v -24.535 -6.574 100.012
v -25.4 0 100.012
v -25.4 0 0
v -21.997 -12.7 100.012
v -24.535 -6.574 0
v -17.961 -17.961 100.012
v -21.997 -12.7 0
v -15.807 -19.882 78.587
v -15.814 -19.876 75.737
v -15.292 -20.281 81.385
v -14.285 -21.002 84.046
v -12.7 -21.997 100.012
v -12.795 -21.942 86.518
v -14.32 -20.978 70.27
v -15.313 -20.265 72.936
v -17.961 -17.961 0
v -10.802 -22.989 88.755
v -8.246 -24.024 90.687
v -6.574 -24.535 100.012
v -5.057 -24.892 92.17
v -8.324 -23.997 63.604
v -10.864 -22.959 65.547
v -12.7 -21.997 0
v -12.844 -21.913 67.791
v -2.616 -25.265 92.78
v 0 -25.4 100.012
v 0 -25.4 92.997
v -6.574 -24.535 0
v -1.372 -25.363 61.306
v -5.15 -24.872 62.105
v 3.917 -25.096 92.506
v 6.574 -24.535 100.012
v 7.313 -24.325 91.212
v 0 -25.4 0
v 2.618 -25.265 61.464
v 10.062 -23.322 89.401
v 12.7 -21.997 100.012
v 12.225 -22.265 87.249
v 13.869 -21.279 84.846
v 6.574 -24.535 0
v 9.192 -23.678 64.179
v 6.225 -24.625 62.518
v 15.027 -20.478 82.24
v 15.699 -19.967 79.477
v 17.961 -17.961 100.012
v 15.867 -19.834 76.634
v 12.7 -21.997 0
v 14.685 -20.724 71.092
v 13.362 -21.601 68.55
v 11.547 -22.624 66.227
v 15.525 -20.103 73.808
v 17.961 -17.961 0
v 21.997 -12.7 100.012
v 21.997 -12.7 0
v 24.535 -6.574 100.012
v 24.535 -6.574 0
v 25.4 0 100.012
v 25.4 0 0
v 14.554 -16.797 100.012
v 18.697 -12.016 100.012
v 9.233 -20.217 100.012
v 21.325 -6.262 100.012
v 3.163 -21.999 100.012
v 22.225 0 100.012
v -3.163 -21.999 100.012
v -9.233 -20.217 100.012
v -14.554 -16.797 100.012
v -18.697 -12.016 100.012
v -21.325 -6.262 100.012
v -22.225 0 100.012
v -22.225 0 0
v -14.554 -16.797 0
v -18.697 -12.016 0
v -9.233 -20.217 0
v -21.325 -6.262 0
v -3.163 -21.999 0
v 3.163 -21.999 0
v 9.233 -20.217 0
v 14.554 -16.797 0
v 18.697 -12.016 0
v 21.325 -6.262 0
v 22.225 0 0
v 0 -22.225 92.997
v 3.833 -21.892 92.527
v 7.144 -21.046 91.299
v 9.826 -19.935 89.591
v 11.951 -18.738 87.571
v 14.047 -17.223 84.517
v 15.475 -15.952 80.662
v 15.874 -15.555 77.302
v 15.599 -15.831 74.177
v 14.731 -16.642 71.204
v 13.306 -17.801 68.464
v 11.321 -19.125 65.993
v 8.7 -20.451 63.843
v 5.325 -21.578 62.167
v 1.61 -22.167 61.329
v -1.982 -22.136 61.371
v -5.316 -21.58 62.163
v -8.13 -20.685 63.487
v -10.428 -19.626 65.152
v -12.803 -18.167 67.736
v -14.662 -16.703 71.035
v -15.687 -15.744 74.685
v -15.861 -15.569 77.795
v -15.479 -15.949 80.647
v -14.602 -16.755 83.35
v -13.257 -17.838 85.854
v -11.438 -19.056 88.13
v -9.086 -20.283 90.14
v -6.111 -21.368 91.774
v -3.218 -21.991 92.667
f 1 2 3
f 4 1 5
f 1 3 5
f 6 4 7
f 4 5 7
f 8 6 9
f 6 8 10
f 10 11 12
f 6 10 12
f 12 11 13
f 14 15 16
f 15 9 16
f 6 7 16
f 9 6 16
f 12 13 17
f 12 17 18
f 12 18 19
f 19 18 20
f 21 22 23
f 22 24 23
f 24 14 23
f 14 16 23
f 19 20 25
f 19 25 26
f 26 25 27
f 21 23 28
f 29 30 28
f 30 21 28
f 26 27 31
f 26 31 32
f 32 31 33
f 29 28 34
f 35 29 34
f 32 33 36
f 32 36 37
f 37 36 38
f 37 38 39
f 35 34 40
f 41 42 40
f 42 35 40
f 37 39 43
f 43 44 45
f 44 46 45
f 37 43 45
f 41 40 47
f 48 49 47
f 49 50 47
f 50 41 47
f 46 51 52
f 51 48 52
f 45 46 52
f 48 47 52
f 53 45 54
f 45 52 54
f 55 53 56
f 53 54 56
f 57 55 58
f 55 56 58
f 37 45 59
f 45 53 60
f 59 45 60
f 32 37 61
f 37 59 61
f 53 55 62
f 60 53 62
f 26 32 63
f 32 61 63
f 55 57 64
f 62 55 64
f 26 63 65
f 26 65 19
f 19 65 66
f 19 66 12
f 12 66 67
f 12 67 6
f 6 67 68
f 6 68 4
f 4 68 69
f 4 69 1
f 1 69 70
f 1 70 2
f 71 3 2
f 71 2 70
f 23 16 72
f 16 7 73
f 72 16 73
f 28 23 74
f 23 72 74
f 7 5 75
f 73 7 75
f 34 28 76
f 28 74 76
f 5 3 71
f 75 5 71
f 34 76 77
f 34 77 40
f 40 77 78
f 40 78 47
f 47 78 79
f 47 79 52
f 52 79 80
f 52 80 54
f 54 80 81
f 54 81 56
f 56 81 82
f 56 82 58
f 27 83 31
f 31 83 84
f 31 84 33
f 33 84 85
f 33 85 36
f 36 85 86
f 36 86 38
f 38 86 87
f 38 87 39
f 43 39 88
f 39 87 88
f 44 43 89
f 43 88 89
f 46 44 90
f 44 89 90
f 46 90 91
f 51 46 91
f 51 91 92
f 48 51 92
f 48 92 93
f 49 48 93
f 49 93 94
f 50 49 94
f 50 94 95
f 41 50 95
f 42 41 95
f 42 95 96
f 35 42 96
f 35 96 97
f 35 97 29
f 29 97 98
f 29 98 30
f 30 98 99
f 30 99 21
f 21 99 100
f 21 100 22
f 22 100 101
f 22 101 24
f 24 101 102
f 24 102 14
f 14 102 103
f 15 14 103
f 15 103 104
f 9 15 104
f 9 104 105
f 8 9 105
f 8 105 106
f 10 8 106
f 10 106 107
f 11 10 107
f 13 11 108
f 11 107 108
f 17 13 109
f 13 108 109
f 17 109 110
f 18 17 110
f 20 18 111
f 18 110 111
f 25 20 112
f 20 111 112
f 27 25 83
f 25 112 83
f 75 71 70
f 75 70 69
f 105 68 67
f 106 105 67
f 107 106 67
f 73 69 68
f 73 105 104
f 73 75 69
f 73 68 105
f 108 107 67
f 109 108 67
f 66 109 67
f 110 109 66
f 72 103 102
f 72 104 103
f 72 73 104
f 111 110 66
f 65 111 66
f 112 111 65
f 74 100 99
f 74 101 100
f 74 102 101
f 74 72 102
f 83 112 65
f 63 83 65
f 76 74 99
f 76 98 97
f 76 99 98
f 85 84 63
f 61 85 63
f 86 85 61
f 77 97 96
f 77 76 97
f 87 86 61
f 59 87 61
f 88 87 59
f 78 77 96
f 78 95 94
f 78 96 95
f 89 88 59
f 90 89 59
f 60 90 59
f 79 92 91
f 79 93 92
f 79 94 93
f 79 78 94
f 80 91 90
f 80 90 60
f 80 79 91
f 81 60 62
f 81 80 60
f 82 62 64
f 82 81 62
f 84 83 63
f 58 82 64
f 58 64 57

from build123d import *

# Parameters (mm, degrees)
SKETCH1_R           = 25.4
SKETCH1_R_2         = 22.225
BOSS_EXTRUDE1_DEPTH = 914.4
CUT_EXTRUDE1_START  = -100.0125
SKETCH2_R           = 25.4
CUT_EXTRUDE1_DEPTH  = 816.09278356
CUT_EXTRUDE3_DEPTH  = 107.267681617
SKETCH6_R           = 15.875
CUT_EXTRUDE5_DEPTH  = 107.267681617


with BuildPart() as part:
    # Sketch1 → Boss-Extrude1 (new body)
    with BuildSketch(Plane.XY):
        Circle(SKETCH1_R)
        Circle(SKETCH1_R_2, mode=Mode.SUBTRACT)
    extrude(amount=BOSS_EXTRUDE1_DEPTH)

    # Sketch2 → Cut-Extrude1 (cut, through all)
    with BuildSketch(Plane(origin=(0, 0, 0), x_dir=(-1, 0, 0), z_dir=(0, 0, -1)).offset(CUT_EXTRUDE1_START)):
        Circle(SKETCH2_R)
    extrude(amount=-CUT_EXTRUDE1_DEPTH, mode=Mode.SUBTRACT)

    # Sketch4 → Cut-Extrude3 (cut, through all)
    with BuildSketch(Plane.XY):
        with BuildLine():
            Line((-25.4, 0), (25.4, 0))
            ThreePointArc((25.4, 0), (0, 25.4), (-25.4, 0))
        make_face()
    extrude(amount=CUT_EXTRUDE3_DEPTH, mode=Mode.SUBTRACT)

    # Sketch6 → Cut-Extrude5 (cut, through all)
    with BuildSketch(Plane(origin=(0, 0, 0), x_dir=(1, 0, 0), z_dir=(0, 1, 0))):
        with Locations(Location((0, -77.121807345, 0), (0, 0, 270))):
            Circle(SKETCH6_R)
    extrude(amount=-CUT_EXTRUDE5_DEPTH, mode=Mode.SUBTRACT)


solid = part.part
